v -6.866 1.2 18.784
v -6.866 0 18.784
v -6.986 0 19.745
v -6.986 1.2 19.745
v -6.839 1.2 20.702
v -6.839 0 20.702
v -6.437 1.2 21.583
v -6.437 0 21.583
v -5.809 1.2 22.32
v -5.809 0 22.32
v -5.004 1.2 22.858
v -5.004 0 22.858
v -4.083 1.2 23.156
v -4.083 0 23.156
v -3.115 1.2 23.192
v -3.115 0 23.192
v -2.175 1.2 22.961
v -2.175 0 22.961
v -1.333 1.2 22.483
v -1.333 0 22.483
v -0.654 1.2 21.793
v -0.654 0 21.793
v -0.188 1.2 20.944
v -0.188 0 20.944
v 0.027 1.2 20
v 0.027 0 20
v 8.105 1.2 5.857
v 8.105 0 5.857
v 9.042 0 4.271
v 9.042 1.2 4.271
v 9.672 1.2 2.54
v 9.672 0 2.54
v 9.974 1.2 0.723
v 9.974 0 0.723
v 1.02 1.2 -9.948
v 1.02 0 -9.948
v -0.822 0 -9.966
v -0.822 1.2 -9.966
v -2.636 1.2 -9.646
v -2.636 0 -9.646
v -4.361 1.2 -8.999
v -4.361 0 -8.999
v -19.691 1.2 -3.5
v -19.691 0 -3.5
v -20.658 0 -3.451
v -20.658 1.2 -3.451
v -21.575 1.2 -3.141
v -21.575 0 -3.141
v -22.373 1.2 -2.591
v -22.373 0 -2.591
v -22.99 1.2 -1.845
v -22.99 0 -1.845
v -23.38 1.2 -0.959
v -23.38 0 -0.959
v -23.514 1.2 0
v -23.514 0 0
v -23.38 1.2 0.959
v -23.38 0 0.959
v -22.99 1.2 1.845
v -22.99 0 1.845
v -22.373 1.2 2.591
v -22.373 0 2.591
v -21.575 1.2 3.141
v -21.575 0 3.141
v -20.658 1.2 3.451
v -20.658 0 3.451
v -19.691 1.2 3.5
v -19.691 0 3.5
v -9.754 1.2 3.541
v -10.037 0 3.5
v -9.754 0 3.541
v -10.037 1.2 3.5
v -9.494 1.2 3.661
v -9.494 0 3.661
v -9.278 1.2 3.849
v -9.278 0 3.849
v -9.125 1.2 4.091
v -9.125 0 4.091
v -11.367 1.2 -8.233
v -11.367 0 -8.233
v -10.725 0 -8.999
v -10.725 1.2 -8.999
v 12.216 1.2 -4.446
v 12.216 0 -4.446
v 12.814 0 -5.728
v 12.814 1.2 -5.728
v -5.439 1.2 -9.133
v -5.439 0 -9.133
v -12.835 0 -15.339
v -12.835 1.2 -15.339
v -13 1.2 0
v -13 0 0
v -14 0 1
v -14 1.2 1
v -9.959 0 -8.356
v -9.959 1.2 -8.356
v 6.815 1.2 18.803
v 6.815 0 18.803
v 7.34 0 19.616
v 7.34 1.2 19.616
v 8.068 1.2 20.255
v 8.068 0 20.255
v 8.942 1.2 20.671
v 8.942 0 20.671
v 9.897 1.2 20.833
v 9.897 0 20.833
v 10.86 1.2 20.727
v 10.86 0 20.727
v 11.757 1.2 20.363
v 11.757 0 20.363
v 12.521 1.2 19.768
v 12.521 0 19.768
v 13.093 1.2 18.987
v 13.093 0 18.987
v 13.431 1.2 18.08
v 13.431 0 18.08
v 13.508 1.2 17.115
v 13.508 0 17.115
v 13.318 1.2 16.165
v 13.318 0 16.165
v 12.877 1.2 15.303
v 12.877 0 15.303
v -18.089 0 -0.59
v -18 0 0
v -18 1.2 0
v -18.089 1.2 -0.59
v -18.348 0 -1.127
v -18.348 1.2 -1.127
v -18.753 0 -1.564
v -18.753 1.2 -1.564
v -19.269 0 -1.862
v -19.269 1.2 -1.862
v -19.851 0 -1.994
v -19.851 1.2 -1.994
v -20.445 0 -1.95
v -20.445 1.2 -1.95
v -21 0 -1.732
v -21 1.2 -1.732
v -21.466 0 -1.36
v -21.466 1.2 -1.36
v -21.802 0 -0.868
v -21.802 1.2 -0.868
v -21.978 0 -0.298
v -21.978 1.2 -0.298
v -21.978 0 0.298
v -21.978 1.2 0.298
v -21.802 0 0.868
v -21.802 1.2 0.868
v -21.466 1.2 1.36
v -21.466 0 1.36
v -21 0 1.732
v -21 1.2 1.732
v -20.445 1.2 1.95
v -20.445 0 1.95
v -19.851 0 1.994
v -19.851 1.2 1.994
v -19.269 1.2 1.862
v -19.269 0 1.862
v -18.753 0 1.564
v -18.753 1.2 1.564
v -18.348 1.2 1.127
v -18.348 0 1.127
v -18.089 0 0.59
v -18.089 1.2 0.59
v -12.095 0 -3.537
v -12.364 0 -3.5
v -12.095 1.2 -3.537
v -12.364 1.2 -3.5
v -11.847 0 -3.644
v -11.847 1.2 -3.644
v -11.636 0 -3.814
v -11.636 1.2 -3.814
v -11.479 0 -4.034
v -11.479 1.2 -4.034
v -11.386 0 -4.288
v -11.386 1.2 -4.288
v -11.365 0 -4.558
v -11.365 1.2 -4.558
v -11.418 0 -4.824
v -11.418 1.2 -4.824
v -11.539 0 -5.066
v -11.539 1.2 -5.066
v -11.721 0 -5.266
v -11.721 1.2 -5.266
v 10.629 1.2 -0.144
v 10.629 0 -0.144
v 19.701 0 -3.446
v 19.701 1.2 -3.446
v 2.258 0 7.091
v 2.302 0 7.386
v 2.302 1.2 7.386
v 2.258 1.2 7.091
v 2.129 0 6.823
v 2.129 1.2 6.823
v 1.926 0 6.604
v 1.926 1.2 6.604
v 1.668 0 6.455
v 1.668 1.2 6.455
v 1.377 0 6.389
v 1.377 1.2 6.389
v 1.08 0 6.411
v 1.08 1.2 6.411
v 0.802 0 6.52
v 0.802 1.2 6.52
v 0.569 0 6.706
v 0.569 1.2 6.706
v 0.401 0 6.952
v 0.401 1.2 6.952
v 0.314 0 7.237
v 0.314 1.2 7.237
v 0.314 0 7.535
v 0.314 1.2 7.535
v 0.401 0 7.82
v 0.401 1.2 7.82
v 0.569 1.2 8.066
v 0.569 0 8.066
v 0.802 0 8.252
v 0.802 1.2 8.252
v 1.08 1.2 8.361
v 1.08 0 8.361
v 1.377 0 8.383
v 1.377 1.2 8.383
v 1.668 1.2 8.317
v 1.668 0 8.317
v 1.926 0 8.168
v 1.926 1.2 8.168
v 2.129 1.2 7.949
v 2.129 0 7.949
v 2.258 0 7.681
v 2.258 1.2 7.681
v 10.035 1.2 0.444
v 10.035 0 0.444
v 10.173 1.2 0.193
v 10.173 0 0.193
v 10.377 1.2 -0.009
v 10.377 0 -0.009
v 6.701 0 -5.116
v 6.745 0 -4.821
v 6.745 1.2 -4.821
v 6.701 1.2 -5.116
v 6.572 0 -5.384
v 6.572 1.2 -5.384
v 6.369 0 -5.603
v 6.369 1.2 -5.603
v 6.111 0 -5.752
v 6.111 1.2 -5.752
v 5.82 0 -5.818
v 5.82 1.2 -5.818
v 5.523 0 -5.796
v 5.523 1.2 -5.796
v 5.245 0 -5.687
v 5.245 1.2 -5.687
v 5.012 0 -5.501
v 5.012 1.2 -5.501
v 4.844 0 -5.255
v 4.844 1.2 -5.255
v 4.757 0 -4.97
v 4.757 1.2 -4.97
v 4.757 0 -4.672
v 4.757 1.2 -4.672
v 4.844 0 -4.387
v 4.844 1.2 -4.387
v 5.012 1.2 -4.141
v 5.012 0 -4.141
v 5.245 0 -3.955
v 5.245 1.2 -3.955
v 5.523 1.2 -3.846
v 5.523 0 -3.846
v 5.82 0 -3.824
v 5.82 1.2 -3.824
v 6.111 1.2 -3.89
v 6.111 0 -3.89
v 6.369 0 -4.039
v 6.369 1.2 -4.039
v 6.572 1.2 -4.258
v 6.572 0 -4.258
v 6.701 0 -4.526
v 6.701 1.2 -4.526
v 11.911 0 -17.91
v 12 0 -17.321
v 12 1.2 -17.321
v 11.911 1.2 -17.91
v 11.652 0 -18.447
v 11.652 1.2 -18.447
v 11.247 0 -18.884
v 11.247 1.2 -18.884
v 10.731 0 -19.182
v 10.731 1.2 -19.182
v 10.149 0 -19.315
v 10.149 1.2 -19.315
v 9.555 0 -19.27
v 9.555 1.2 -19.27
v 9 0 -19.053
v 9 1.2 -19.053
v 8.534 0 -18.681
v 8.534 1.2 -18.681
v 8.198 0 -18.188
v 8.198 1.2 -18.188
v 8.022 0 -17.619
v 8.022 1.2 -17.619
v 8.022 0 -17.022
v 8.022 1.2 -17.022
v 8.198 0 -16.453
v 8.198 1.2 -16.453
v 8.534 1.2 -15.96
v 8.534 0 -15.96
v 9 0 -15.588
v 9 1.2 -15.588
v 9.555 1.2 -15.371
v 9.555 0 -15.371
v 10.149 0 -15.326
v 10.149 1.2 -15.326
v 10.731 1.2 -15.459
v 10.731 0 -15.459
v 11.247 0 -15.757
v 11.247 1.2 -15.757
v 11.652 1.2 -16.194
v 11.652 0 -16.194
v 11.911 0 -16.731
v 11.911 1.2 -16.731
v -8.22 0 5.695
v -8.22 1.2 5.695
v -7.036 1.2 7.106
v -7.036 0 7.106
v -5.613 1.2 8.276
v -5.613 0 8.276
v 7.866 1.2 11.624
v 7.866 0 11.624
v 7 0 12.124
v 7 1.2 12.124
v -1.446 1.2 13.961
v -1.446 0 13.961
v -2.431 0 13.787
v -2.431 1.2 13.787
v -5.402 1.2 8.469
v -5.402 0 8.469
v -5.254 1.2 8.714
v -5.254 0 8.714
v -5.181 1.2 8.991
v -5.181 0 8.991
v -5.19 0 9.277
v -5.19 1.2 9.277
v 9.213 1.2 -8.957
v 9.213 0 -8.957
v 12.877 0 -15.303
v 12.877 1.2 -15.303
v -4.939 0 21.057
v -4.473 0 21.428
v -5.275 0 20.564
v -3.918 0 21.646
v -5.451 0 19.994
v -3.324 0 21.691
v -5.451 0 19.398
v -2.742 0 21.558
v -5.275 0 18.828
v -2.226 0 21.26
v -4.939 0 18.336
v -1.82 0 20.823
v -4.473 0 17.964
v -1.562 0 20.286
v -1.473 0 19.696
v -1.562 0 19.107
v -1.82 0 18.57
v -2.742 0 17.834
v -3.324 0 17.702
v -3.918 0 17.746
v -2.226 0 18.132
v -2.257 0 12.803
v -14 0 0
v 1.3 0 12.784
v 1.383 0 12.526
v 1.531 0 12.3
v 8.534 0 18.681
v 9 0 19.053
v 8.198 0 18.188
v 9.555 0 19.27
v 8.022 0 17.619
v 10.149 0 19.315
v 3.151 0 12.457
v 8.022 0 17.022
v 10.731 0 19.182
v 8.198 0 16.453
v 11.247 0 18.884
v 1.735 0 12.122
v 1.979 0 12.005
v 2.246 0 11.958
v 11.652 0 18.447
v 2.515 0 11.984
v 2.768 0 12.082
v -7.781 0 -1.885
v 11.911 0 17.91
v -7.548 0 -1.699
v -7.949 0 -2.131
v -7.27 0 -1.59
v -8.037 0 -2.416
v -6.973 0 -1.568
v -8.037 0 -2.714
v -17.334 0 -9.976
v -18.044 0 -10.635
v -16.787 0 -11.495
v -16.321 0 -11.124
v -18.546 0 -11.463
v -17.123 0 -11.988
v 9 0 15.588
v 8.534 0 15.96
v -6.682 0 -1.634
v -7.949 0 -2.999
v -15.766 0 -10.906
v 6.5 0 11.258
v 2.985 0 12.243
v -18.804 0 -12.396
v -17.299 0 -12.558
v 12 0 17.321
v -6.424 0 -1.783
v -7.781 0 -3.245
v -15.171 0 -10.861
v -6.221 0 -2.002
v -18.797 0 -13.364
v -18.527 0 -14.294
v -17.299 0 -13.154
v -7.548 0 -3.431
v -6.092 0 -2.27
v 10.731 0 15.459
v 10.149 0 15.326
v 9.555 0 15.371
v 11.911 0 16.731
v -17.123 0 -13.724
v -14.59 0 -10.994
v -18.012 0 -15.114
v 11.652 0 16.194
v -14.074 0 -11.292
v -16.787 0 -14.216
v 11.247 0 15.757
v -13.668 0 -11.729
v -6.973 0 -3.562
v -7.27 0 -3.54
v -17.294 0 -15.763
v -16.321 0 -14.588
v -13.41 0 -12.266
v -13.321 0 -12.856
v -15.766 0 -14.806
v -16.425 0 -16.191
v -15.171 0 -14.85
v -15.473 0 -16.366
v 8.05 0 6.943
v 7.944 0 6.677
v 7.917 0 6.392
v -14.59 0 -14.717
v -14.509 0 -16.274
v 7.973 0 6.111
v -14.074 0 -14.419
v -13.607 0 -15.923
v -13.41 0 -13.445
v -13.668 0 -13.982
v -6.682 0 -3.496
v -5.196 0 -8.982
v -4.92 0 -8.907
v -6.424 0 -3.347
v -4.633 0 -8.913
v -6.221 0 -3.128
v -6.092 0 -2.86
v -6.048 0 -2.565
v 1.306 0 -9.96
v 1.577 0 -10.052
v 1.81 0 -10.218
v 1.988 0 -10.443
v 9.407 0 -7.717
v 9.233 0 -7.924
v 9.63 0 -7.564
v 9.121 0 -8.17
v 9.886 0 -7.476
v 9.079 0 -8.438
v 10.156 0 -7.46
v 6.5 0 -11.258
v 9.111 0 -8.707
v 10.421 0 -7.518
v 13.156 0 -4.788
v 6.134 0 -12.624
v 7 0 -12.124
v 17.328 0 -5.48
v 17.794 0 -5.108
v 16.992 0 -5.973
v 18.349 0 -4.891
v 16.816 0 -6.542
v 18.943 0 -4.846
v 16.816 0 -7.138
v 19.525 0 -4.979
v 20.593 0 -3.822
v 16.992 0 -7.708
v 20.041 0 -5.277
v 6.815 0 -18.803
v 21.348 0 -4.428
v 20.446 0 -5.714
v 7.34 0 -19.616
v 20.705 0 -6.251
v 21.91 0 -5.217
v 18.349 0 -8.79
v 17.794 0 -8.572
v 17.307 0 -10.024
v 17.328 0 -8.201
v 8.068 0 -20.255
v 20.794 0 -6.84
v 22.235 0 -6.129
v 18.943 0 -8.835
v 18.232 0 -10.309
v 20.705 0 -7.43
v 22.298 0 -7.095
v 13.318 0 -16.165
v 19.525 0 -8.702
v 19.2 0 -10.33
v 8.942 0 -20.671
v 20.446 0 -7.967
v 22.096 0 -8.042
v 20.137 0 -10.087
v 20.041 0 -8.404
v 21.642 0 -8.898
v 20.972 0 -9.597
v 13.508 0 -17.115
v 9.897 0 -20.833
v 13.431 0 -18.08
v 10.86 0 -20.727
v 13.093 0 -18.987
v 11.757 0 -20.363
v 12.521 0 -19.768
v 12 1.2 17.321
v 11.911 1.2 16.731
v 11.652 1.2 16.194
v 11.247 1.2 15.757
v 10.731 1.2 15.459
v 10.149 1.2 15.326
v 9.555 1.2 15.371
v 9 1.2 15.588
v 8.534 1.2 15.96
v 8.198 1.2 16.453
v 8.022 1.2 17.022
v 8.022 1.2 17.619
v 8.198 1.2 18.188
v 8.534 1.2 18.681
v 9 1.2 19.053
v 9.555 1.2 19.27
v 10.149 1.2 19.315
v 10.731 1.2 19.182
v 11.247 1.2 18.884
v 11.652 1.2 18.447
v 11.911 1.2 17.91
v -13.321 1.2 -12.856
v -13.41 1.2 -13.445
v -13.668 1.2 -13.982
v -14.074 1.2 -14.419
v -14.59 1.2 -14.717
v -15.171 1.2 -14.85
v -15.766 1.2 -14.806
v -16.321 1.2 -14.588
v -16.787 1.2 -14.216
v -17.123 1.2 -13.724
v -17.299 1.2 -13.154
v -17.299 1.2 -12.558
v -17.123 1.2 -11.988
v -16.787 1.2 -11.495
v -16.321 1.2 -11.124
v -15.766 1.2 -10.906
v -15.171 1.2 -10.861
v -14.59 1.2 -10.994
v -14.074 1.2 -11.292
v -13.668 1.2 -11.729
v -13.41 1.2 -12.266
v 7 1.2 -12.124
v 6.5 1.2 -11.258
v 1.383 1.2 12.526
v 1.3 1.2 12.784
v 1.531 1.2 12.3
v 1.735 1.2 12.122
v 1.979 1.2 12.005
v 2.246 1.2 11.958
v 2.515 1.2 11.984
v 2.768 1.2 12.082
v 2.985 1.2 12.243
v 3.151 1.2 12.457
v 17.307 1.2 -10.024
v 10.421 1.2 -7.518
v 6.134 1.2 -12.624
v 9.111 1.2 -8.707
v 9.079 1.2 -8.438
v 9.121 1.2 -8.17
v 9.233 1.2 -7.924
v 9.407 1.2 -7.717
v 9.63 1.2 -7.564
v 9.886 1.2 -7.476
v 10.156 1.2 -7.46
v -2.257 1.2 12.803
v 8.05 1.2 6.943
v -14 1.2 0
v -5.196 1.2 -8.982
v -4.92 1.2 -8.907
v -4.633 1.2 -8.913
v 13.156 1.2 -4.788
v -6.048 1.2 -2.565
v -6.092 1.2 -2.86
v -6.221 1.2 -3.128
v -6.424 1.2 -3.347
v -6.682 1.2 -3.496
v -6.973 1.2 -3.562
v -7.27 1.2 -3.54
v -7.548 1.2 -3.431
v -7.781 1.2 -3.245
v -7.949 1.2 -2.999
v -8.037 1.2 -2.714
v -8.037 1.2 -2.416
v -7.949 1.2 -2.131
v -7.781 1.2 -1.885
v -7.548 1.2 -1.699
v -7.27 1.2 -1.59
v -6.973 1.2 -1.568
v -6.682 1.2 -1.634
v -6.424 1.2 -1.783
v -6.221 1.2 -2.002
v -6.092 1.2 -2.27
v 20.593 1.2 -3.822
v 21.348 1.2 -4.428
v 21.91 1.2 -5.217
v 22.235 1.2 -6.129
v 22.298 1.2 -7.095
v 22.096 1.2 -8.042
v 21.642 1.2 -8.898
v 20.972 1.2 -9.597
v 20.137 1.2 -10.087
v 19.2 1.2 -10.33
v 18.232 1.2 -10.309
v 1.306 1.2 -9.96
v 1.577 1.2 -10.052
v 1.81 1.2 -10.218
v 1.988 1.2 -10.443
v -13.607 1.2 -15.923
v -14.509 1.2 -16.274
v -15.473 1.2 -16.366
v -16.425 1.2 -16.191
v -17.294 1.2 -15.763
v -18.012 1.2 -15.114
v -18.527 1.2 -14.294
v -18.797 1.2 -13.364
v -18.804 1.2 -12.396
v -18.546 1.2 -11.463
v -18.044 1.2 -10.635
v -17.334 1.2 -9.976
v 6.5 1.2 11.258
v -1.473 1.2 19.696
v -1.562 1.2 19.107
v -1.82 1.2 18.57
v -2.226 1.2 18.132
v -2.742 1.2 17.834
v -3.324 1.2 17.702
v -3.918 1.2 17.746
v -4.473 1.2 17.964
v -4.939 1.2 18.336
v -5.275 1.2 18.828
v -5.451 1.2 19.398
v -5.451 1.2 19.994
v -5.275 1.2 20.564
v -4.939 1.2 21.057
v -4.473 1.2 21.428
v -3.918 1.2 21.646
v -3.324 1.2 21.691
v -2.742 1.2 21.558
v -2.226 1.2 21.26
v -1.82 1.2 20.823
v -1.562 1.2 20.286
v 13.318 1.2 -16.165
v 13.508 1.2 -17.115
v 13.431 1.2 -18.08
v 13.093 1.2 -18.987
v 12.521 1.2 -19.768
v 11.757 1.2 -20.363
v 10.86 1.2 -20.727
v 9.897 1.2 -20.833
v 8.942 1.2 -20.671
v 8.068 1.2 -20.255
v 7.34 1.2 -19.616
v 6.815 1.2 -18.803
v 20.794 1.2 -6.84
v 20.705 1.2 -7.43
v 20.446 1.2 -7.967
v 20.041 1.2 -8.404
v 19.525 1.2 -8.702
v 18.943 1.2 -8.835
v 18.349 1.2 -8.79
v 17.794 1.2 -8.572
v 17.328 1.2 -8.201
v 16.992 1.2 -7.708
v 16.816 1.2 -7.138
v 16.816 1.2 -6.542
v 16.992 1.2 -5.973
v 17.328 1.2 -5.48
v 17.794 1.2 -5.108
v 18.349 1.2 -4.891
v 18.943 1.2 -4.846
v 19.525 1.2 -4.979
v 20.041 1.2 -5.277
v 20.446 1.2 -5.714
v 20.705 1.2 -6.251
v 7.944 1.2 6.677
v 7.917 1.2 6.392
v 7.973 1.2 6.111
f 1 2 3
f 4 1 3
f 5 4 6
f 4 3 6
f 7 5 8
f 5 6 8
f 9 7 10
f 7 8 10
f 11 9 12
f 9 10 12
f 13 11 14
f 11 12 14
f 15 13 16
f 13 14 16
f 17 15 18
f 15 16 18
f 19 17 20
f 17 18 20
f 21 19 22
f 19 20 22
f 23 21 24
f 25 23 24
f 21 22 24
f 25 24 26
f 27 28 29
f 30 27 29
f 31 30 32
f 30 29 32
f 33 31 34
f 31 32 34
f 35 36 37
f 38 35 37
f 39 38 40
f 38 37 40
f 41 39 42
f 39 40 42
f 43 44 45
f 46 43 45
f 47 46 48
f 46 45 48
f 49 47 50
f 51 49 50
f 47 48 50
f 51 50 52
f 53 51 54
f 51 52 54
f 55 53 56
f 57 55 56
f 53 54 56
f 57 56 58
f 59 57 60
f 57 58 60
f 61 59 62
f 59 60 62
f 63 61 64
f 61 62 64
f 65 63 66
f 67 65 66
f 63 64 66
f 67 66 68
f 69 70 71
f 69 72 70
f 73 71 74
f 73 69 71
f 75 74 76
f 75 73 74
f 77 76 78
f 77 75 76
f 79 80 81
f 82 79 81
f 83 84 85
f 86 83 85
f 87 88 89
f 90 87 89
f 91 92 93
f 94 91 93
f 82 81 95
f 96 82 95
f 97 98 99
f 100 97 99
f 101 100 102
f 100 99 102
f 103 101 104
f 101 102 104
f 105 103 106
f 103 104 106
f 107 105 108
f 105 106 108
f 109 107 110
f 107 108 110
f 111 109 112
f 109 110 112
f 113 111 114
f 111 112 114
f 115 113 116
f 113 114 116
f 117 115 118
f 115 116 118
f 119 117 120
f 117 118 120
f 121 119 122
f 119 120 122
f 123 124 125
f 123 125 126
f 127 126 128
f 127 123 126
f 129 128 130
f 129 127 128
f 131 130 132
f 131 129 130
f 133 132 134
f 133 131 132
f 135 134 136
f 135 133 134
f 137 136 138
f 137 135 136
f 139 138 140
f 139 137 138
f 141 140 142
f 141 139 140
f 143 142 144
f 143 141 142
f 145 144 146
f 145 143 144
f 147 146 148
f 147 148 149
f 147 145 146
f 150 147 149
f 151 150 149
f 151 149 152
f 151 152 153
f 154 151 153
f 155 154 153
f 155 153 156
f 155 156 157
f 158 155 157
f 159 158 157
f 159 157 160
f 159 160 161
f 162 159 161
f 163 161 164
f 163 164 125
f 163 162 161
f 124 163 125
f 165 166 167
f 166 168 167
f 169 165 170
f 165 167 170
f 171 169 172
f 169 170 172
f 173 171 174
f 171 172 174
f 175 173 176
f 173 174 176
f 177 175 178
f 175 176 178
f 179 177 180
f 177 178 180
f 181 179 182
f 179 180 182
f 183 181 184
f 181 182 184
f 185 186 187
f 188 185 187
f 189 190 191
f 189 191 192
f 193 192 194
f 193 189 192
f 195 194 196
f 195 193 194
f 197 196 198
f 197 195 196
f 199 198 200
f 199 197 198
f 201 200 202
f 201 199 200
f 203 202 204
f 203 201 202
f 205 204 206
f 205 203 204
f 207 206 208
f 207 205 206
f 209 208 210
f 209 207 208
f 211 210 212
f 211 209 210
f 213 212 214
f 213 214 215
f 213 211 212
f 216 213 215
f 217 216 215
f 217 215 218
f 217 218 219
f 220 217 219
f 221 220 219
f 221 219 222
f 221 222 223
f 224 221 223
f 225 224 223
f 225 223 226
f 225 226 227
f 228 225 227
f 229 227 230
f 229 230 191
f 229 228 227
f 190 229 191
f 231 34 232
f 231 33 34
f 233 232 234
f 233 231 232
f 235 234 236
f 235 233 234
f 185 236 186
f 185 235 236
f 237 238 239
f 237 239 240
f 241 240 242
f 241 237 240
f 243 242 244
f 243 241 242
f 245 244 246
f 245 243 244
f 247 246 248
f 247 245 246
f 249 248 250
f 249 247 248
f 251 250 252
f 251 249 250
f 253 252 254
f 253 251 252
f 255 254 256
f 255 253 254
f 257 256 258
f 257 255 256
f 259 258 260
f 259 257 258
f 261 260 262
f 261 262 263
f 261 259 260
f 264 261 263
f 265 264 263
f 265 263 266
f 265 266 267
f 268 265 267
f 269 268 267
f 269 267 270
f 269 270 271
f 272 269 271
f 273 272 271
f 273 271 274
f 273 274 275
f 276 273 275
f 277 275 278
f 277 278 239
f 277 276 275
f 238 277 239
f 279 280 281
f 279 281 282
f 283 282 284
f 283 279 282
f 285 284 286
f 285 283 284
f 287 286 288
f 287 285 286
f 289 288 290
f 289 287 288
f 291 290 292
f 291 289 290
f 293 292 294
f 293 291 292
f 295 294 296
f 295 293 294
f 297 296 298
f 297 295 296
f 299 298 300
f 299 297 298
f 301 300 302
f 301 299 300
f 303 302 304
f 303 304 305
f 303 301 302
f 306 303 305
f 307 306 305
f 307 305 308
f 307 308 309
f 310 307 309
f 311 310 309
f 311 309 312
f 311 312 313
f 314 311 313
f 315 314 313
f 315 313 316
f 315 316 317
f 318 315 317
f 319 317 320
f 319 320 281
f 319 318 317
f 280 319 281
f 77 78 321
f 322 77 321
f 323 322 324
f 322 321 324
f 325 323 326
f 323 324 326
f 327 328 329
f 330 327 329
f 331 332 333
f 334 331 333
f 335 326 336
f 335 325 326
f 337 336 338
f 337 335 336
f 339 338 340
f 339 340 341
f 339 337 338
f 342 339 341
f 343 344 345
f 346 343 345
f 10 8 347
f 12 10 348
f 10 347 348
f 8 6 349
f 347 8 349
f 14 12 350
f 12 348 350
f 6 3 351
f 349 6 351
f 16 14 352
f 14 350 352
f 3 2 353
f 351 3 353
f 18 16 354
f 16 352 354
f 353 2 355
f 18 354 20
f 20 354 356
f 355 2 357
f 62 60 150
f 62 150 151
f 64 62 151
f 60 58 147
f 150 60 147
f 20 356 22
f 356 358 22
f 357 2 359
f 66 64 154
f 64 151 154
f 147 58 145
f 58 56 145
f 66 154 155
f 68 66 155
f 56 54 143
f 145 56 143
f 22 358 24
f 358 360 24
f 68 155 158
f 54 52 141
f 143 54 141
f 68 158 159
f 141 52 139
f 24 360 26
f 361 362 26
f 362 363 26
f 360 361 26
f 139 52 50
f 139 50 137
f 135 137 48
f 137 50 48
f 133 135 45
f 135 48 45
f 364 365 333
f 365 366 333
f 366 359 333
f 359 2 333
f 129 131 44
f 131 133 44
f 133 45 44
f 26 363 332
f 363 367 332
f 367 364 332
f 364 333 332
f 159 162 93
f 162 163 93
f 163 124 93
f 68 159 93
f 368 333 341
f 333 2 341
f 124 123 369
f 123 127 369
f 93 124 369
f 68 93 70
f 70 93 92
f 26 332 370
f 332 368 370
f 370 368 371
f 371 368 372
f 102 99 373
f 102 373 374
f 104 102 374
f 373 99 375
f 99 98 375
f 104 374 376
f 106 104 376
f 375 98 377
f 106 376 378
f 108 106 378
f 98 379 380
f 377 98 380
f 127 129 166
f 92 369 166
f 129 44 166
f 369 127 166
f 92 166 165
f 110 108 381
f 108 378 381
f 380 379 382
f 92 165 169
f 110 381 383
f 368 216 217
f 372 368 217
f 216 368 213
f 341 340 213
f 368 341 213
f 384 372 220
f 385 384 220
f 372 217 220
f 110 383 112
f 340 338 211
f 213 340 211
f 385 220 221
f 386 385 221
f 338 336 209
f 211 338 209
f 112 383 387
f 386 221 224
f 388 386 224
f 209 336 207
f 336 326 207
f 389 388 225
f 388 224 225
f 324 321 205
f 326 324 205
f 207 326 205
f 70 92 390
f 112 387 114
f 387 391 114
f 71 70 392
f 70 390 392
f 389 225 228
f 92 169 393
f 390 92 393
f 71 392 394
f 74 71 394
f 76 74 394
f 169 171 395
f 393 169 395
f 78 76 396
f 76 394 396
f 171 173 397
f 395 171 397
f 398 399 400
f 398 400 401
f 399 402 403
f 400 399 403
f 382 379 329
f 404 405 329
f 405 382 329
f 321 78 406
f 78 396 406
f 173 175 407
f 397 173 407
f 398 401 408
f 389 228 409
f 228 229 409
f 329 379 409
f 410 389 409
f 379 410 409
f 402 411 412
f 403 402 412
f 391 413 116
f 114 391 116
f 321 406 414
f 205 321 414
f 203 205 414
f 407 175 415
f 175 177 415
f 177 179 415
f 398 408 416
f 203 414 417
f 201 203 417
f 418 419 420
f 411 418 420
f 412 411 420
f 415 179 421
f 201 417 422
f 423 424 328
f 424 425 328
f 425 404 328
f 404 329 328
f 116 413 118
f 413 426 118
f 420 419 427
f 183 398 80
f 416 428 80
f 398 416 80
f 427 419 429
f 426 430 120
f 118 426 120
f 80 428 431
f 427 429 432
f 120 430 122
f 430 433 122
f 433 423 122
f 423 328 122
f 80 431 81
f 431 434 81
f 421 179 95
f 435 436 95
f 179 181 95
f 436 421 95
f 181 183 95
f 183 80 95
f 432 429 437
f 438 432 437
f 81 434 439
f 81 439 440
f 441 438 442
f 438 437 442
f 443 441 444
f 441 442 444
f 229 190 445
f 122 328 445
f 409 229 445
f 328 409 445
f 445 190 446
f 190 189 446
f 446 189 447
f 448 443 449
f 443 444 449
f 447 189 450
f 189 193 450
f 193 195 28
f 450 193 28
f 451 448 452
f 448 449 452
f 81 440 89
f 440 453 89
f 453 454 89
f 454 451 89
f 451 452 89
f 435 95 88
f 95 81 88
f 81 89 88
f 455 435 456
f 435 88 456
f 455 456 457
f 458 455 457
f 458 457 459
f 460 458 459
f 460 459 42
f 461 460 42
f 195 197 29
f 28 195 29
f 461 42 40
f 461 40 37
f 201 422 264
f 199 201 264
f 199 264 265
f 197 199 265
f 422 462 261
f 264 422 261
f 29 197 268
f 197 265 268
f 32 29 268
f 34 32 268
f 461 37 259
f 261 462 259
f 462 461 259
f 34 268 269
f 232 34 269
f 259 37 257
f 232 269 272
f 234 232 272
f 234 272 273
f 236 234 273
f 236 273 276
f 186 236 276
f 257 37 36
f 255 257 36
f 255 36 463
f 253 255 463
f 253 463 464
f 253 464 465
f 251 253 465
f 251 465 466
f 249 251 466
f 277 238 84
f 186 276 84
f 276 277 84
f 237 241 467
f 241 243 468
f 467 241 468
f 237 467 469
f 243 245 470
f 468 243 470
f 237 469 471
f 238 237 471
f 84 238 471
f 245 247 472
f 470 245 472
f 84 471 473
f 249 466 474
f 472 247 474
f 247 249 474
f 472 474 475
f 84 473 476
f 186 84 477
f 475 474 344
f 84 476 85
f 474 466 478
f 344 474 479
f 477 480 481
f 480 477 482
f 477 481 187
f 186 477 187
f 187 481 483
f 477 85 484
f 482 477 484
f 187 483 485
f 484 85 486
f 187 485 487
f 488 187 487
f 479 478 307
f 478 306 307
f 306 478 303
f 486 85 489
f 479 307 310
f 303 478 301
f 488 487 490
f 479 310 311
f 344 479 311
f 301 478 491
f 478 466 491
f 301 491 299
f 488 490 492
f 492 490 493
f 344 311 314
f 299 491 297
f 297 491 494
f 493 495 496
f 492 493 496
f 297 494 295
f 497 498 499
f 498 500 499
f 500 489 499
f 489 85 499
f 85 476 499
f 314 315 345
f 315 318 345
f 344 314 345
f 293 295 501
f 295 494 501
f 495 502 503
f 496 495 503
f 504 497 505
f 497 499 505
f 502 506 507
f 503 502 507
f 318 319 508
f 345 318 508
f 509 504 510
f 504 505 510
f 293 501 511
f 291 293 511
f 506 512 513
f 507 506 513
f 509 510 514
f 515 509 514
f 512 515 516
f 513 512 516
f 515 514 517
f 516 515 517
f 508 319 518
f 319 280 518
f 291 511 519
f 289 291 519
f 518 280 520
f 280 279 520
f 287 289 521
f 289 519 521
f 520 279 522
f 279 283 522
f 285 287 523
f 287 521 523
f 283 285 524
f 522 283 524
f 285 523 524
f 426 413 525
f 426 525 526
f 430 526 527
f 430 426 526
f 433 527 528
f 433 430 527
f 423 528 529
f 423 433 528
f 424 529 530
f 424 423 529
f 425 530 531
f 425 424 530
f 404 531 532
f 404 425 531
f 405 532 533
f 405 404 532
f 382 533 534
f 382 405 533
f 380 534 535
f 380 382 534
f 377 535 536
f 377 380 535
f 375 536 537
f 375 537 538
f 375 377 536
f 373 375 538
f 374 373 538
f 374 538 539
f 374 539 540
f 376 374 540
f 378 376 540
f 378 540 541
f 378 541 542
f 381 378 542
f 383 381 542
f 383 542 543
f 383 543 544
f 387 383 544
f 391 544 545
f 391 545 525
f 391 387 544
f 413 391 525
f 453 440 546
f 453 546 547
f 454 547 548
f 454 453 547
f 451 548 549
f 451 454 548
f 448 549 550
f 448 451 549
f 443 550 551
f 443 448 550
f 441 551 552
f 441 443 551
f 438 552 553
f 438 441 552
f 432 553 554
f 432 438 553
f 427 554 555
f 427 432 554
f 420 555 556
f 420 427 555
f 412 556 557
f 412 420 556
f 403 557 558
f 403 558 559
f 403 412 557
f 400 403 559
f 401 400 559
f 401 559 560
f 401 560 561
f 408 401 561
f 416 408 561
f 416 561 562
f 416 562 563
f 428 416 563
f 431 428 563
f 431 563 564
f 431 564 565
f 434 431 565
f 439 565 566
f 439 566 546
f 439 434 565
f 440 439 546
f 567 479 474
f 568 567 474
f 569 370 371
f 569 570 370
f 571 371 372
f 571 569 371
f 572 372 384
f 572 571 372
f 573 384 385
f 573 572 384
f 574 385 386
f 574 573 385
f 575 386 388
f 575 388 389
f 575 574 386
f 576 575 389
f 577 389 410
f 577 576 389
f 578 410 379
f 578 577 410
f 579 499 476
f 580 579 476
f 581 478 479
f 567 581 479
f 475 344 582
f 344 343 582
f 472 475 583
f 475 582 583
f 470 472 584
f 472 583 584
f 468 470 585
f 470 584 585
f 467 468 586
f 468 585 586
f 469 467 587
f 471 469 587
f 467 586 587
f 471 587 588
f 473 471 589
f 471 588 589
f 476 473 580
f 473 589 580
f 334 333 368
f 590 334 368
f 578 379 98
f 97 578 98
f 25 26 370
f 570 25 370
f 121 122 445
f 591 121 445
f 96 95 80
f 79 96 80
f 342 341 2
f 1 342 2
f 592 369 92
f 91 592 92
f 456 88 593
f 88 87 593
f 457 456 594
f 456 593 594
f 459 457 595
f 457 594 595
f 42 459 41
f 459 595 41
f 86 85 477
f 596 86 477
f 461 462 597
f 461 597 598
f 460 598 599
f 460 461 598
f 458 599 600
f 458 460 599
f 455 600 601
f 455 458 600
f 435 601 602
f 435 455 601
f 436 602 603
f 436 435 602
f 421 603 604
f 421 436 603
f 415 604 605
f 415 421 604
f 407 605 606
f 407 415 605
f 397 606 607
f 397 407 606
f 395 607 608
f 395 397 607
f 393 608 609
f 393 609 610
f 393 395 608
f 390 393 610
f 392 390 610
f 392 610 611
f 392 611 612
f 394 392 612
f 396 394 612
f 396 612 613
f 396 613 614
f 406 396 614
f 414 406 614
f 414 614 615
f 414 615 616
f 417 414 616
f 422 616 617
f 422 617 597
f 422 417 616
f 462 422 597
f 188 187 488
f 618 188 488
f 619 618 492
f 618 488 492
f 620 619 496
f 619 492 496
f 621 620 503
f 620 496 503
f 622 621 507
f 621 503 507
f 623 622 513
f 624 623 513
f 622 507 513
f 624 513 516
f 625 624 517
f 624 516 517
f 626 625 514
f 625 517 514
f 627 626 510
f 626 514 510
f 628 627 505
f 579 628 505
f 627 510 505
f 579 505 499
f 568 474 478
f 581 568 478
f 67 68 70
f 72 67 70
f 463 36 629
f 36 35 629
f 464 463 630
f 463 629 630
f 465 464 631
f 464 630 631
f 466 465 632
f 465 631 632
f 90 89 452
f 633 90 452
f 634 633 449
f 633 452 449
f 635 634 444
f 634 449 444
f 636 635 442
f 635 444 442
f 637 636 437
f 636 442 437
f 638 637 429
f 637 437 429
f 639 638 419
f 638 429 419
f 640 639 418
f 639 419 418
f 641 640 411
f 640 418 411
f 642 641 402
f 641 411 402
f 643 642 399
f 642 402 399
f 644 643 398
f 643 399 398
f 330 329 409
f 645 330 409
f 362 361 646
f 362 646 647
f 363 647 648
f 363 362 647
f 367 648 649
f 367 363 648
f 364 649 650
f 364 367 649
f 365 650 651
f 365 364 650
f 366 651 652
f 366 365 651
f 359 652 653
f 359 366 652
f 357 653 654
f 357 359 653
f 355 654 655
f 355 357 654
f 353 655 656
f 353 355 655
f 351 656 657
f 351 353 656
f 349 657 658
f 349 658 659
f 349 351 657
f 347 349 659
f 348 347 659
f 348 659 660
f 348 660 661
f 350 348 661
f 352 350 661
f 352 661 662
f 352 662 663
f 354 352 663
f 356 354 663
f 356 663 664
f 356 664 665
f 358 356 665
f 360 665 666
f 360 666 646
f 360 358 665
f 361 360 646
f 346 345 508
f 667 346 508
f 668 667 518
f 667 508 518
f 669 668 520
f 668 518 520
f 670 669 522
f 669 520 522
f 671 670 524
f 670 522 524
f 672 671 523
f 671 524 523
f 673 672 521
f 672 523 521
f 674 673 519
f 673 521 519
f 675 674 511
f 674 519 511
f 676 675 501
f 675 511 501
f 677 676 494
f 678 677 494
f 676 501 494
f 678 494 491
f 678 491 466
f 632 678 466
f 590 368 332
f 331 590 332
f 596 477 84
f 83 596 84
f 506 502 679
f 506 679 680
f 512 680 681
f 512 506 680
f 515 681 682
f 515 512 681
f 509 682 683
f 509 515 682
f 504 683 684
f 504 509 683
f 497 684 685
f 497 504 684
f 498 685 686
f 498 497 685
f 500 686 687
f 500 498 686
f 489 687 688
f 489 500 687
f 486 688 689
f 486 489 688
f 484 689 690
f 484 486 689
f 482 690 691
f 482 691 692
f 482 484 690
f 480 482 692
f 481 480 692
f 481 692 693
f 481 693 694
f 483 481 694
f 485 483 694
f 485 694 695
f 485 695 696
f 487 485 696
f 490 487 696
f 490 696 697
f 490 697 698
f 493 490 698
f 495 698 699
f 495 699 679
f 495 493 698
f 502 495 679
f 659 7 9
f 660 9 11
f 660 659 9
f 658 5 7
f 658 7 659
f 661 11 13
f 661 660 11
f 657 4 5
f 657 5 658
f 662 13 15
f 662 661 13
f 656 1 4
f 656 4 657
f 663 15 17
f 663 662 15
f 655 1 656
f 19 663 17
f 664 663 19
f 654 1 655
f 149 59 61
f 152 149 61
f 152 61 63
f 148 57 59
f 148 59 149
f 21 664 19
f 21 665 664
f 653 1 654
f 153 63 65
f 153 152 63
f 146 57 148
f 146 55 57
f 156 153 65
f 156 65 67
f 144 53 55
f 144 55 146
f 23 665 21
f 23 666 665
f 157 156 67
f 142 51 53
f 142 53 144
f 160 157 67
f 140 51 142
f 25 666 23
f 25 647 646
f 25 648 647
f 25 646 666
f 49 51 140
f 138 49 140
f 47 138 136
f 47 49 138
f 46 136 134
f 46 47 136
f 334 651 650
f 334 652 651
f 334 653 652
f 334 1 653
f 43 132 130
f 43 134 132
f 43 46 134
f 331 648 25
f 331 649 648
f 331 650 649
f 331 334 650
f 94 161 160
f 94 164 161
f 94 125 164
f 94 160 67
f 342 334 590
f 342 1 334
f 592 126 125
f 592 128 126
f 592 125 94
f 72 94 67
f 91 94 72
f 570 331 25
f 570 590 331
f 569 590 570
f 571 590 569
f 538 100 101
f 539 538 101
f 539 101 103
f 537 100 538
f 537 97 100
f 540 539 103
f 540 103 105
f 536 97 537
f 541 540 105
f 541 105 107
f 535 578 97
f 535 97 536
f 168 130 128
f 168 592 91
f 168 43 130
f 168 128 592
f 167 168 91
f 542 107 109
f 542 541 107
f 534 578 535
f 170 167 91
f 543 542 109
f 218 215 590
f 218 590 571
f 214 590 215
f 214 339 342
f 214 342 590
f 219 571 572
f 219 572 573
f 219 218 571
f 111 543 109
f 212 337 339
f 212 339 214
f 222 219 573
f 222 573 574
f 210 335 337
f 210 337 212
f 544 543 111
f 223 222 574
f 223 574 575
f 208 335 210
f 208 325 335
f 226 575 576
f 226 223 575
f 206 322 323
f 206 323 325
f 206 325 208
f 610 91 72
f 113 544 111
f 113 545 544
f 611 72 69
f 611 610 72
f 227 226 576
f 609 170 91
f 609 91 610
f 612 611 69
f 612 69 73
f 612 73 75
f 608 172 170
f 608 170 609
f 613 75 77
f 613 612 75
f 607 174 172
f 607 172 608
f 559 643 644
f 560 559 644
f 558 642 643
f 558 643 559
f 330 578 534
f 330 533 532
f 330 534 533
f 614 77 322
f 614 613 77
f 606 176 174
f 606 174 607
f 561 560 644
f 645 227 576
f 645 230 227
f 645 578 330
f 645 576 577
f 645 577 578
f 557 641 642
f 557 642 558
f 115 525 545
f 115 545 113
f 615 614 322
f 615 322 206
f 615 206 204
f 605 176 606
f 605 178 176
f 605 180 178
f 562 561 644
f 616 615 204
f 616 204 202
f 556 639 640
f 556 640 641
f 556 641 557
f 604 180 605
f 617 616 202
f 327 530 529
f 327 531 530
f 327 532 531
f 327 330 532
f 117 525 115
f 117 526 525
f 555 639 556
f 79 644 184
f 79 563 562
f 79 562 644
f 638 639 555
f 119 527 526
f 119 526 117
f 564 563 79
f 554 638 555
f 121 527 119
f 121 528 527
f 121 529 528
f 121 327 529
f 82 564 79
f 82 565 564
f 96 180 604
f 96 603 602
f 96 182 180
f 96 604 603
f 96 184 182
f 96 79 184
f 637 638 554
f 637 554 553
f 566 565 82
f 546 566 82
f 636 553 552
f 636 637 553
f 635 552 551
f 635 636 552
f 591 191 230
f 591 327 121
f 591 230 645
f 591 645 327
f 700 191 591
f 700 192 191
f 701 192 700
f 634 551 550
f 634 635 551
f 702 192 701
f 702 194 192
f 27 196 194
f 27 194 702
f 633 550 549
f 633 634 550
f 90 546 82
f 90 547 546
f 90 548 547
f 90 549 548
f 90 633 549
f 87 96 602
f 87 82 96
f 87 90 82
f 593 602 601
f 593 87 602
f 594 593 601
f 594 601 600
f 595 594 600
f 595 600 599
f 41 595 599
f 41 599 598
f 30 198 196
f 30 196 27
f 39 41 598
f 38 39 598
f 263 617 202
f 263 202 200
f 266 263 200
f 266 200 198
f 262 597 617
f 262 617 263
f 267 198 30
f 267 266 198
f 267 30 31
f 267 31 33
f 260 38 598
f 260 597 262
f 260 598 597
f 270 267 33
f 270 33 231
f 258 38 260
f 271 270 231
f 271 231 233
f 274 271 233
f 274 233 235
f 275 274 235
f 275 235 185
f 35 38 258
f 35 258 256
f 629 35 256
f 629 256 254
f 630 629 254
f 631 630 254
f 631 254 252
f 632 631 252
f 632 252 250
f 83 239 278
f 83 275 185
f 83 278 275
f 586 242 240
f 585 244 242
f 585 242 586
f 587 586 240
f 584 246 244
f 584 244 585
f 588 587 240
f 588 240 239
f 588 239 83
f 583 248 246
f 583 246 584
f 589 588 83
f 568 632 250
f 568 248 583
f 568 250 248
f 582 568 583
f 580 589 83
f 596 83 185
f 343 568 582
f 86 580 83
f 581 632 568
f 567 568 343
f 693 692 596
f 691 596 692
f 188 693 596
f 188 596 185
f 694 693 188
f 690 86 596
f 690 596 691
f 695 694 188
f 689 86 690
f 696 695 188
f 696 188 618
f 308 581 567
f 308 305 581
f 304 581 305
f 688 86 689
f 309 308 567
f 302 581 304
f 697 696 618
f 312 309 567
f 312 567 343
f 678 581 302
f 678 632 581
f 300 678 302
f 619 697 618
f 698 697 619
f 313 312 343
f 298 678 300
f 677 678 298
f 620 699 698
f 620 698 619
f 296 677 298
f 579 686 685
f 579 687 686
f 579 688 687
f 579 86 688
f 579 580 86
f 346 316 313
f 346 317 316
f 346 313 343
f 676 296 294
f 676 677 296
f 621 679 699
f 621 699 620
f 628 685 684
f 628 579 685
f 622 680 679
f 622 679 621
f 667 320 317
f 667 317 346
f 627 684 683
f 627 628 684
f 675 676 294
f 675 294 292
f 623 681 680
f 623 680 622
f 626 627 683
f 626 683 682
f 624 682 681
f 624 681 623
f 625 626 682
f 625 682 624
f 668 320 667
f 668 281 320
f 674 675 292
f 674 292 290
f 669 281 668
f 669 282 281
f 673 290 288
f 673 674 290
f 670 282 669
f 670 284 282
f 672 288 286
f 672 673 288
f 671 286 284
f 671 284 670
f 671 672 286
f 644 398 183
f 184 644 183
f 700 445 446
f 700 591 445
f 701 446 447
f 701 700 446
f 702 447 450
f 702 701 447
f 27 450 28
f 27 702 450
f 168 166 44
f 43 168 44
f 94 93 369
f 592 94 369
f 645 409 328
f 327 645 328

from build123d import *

# Parameters (mm, degrees)
SKETCH1_R           = 2
SKETCH1_R_2         = 1
BOSS_EXTRUDE1_DEPTH = 1.2
FILLET1_R           = 1


with BuildPart() as part:
    # Sketch1 → Boss-Extrude1 (new body)
    with BuildSketch(Plane(origin=(0, 0, 0), x_dir=(1, 0, 0), z_dir=(0, 1, 0))):
        with BuildLine():
            ThreePointArc((-19.691368668, 3.5), (-23.513581264, 0), (-19.691368668, -3.5))
            Line((-19.691368668, -3.5), (-9.367496998, -3.5))
            ThreePointArc((-9.367496998, -3.5), (-7.660444431, -6.427876097), (-5.073475918, -8.617415048))
            Line((-5.073475918, -8.617415048), (-6.86619742, -18.784443909))
            ThreePointArc((-6.86619742, -18.784443909), (-4.083090537, -23.15635713), (0.027456851, -19.999981153))
            Line((0.027456851, -19.999981153), (1.776996571, -10.077848346))
            Line((1.776996571, -10.077848346), (6.814595421, -18.803225501))
            ThreePointArc((6.814595421, -18.803225501), (11.756790632, -20.363358709), (12.876773247, -15.303225501))
            Line((12.876773247, -15.303225501), (7.714837412, -6.36249037))
            ThreePointArc((7.714837412, -6.36249037), (9.396926208, -3.420201433), (9.999638306, -0.085051507))
            Line((9.999638306, -0.085051507), (19.700904332, 3.445920561))
            ThreePointArc((19.700904332, 3.445920561), (22.095538802, 8.042118434), (17.306763328, 10.023768907))
            Line((17.306763328, 10.023768907), (7.839174397, 6.577848346))
            Line((7.839174397, 6.577848346), (12.876773247, 15.303225501))
            ThreePointArc((12.876773247, 15.303225501), (11.756790632, 20.363358709), (6.814595421, 18.803225501))
            Line((6.814595421, 18.803225501), (1.652659586, 9.86249037))
            ThreePointArc((1.652659586, 9.86249037), (-1.736481777, 9.84807753), (-4.926162387, 8.702466555))
            Line((-4.926162387, 8.702466555), (-12.834706911, 15.338523348))
            ThreePointArc((-12.834706911, 15.338523348), (-18.012448265, 15.114238696), (-17.334220179, 9.976212246))
            Line((-17.334220179, 9.976212246), (-9.616170968, 3.5))
            Line((-9.616170968, 3.5), (-19.691368668, 3.5))
        make_face()
        with Locations((-20, 0)):
            Circle(SKETCH1_R, mode=Mode.SUBTRACT)
        Polygon((-14, -1), (-14, 0), (-13, 0), align=None, mode=Mode.SUBTRACT)
        with Locations((5.745333323, 4.820907073)):
            Circle(SKETCH1_R_2, mode=Mode.SUBTRACT)
        with Locations((1.302361333, -7.386058148)):
            Circle(SKETCH1_R_2, mode=Mode.SUBTRACT)
        with Locations((-7.047694656, 2.565151075)):
            Circle(SKETCH1_R_2, mode=Mode.SUBTRACT)
        Polygon((-2.25742631, -12.802500789), (-1.446266734, -13.96095672), (-2.431074487, -13.787308542), align=None, mode=Mode.SUBTRACT)
        with Locations((-3.472963553, -19.69615506)):
            Circle(SKETCH1_R, mode=Mode.SUBTRACT)
        with Locations((-15.320888862, 12.855752194)):
            Circle(SKETCH1_R, mode=Mode.SUBTRACT)
        Polygon((-10.724622204, 8.999026536), (-9.958577761, 8.356238926), (-11.367409813, 8.232982092), align=None, mode=Mode.SUBTRACT)
        Polygon((7, -12.124355653), (6.5, -11.258330249), (7.866025404, -11.624355653), align=None, mode=Mode.SUBTRACT)
        with Locations((10, -17.320508076)):
            Circle(SKETCH1_R, mode=Mode.SUBTRACT)
        with Locations((10, 17.320508076)):
            Circle(SKETCH1_R, mode=Mode.SUBTRACT)
        Polygon((6.133974596, 12.624355653), (7, 12.124355653), (6.5, 11.258330249), align=None, mode=Mode.SUBTRACT)
        with Locations((18.793852416, 6.840402867)):
            Circle(SKETCH1_R, mode=Mode.SUBTRACT)
        Polygon((13.155696691, 4.788282007), (12.21600407, 4.446261863), (12.813676548, 5.727974627), align=None, mode=Mode.SUBTRACT)
    extrude(amount=BOSS_EXTRUDE1_DEPTH)

    # Fillet1
    fillet1_edges = [part.edges().sort_by_distance(p)[0] for p in [
        (17.306763328, 0.6, -10.023768907),
        (19.700904332, 0.6, -3.445920561),
        (9.999638306, 0.6, 0.085051507),
        (7.714837412, 0.6, 6.36249037),
        (12.876773247, 0.6, 15.303225501),
        (6.814595421, 0.6, 18.803225501),
        (1.776996571, 0.6, 10.077848346),
        (0.027456851, 0.6, 19.999981153),
        (-6.86619742, 0.6, 18.784443909),
        (-5.073475918, 0.6, 8.617415048),
        (-9.367496998, 0.6, 3.5),
        (-19.691368668, 0.6, 3.5),
        (-19.691368668, 0.6, -3.5),
        (-9.616170968, 0.6, -3.5),
        (-17.334220179, 0.6, -9.976212246),
        (-12.834706911, 0.6, -15.338523348),
        (-4.926162387, 0.6, -8.702466555),
        (1.652659586, 0.6, -9.86249037),
        (6.814595421, 0.6, -18.803225501),
        (12.876773247, 0.6, -15.303225501),
        (7.839174397, 0.6, -6.577848346),
    ]]
    fillet(fillet1_edges, radius=FILLET1_R)


solid = part.part
